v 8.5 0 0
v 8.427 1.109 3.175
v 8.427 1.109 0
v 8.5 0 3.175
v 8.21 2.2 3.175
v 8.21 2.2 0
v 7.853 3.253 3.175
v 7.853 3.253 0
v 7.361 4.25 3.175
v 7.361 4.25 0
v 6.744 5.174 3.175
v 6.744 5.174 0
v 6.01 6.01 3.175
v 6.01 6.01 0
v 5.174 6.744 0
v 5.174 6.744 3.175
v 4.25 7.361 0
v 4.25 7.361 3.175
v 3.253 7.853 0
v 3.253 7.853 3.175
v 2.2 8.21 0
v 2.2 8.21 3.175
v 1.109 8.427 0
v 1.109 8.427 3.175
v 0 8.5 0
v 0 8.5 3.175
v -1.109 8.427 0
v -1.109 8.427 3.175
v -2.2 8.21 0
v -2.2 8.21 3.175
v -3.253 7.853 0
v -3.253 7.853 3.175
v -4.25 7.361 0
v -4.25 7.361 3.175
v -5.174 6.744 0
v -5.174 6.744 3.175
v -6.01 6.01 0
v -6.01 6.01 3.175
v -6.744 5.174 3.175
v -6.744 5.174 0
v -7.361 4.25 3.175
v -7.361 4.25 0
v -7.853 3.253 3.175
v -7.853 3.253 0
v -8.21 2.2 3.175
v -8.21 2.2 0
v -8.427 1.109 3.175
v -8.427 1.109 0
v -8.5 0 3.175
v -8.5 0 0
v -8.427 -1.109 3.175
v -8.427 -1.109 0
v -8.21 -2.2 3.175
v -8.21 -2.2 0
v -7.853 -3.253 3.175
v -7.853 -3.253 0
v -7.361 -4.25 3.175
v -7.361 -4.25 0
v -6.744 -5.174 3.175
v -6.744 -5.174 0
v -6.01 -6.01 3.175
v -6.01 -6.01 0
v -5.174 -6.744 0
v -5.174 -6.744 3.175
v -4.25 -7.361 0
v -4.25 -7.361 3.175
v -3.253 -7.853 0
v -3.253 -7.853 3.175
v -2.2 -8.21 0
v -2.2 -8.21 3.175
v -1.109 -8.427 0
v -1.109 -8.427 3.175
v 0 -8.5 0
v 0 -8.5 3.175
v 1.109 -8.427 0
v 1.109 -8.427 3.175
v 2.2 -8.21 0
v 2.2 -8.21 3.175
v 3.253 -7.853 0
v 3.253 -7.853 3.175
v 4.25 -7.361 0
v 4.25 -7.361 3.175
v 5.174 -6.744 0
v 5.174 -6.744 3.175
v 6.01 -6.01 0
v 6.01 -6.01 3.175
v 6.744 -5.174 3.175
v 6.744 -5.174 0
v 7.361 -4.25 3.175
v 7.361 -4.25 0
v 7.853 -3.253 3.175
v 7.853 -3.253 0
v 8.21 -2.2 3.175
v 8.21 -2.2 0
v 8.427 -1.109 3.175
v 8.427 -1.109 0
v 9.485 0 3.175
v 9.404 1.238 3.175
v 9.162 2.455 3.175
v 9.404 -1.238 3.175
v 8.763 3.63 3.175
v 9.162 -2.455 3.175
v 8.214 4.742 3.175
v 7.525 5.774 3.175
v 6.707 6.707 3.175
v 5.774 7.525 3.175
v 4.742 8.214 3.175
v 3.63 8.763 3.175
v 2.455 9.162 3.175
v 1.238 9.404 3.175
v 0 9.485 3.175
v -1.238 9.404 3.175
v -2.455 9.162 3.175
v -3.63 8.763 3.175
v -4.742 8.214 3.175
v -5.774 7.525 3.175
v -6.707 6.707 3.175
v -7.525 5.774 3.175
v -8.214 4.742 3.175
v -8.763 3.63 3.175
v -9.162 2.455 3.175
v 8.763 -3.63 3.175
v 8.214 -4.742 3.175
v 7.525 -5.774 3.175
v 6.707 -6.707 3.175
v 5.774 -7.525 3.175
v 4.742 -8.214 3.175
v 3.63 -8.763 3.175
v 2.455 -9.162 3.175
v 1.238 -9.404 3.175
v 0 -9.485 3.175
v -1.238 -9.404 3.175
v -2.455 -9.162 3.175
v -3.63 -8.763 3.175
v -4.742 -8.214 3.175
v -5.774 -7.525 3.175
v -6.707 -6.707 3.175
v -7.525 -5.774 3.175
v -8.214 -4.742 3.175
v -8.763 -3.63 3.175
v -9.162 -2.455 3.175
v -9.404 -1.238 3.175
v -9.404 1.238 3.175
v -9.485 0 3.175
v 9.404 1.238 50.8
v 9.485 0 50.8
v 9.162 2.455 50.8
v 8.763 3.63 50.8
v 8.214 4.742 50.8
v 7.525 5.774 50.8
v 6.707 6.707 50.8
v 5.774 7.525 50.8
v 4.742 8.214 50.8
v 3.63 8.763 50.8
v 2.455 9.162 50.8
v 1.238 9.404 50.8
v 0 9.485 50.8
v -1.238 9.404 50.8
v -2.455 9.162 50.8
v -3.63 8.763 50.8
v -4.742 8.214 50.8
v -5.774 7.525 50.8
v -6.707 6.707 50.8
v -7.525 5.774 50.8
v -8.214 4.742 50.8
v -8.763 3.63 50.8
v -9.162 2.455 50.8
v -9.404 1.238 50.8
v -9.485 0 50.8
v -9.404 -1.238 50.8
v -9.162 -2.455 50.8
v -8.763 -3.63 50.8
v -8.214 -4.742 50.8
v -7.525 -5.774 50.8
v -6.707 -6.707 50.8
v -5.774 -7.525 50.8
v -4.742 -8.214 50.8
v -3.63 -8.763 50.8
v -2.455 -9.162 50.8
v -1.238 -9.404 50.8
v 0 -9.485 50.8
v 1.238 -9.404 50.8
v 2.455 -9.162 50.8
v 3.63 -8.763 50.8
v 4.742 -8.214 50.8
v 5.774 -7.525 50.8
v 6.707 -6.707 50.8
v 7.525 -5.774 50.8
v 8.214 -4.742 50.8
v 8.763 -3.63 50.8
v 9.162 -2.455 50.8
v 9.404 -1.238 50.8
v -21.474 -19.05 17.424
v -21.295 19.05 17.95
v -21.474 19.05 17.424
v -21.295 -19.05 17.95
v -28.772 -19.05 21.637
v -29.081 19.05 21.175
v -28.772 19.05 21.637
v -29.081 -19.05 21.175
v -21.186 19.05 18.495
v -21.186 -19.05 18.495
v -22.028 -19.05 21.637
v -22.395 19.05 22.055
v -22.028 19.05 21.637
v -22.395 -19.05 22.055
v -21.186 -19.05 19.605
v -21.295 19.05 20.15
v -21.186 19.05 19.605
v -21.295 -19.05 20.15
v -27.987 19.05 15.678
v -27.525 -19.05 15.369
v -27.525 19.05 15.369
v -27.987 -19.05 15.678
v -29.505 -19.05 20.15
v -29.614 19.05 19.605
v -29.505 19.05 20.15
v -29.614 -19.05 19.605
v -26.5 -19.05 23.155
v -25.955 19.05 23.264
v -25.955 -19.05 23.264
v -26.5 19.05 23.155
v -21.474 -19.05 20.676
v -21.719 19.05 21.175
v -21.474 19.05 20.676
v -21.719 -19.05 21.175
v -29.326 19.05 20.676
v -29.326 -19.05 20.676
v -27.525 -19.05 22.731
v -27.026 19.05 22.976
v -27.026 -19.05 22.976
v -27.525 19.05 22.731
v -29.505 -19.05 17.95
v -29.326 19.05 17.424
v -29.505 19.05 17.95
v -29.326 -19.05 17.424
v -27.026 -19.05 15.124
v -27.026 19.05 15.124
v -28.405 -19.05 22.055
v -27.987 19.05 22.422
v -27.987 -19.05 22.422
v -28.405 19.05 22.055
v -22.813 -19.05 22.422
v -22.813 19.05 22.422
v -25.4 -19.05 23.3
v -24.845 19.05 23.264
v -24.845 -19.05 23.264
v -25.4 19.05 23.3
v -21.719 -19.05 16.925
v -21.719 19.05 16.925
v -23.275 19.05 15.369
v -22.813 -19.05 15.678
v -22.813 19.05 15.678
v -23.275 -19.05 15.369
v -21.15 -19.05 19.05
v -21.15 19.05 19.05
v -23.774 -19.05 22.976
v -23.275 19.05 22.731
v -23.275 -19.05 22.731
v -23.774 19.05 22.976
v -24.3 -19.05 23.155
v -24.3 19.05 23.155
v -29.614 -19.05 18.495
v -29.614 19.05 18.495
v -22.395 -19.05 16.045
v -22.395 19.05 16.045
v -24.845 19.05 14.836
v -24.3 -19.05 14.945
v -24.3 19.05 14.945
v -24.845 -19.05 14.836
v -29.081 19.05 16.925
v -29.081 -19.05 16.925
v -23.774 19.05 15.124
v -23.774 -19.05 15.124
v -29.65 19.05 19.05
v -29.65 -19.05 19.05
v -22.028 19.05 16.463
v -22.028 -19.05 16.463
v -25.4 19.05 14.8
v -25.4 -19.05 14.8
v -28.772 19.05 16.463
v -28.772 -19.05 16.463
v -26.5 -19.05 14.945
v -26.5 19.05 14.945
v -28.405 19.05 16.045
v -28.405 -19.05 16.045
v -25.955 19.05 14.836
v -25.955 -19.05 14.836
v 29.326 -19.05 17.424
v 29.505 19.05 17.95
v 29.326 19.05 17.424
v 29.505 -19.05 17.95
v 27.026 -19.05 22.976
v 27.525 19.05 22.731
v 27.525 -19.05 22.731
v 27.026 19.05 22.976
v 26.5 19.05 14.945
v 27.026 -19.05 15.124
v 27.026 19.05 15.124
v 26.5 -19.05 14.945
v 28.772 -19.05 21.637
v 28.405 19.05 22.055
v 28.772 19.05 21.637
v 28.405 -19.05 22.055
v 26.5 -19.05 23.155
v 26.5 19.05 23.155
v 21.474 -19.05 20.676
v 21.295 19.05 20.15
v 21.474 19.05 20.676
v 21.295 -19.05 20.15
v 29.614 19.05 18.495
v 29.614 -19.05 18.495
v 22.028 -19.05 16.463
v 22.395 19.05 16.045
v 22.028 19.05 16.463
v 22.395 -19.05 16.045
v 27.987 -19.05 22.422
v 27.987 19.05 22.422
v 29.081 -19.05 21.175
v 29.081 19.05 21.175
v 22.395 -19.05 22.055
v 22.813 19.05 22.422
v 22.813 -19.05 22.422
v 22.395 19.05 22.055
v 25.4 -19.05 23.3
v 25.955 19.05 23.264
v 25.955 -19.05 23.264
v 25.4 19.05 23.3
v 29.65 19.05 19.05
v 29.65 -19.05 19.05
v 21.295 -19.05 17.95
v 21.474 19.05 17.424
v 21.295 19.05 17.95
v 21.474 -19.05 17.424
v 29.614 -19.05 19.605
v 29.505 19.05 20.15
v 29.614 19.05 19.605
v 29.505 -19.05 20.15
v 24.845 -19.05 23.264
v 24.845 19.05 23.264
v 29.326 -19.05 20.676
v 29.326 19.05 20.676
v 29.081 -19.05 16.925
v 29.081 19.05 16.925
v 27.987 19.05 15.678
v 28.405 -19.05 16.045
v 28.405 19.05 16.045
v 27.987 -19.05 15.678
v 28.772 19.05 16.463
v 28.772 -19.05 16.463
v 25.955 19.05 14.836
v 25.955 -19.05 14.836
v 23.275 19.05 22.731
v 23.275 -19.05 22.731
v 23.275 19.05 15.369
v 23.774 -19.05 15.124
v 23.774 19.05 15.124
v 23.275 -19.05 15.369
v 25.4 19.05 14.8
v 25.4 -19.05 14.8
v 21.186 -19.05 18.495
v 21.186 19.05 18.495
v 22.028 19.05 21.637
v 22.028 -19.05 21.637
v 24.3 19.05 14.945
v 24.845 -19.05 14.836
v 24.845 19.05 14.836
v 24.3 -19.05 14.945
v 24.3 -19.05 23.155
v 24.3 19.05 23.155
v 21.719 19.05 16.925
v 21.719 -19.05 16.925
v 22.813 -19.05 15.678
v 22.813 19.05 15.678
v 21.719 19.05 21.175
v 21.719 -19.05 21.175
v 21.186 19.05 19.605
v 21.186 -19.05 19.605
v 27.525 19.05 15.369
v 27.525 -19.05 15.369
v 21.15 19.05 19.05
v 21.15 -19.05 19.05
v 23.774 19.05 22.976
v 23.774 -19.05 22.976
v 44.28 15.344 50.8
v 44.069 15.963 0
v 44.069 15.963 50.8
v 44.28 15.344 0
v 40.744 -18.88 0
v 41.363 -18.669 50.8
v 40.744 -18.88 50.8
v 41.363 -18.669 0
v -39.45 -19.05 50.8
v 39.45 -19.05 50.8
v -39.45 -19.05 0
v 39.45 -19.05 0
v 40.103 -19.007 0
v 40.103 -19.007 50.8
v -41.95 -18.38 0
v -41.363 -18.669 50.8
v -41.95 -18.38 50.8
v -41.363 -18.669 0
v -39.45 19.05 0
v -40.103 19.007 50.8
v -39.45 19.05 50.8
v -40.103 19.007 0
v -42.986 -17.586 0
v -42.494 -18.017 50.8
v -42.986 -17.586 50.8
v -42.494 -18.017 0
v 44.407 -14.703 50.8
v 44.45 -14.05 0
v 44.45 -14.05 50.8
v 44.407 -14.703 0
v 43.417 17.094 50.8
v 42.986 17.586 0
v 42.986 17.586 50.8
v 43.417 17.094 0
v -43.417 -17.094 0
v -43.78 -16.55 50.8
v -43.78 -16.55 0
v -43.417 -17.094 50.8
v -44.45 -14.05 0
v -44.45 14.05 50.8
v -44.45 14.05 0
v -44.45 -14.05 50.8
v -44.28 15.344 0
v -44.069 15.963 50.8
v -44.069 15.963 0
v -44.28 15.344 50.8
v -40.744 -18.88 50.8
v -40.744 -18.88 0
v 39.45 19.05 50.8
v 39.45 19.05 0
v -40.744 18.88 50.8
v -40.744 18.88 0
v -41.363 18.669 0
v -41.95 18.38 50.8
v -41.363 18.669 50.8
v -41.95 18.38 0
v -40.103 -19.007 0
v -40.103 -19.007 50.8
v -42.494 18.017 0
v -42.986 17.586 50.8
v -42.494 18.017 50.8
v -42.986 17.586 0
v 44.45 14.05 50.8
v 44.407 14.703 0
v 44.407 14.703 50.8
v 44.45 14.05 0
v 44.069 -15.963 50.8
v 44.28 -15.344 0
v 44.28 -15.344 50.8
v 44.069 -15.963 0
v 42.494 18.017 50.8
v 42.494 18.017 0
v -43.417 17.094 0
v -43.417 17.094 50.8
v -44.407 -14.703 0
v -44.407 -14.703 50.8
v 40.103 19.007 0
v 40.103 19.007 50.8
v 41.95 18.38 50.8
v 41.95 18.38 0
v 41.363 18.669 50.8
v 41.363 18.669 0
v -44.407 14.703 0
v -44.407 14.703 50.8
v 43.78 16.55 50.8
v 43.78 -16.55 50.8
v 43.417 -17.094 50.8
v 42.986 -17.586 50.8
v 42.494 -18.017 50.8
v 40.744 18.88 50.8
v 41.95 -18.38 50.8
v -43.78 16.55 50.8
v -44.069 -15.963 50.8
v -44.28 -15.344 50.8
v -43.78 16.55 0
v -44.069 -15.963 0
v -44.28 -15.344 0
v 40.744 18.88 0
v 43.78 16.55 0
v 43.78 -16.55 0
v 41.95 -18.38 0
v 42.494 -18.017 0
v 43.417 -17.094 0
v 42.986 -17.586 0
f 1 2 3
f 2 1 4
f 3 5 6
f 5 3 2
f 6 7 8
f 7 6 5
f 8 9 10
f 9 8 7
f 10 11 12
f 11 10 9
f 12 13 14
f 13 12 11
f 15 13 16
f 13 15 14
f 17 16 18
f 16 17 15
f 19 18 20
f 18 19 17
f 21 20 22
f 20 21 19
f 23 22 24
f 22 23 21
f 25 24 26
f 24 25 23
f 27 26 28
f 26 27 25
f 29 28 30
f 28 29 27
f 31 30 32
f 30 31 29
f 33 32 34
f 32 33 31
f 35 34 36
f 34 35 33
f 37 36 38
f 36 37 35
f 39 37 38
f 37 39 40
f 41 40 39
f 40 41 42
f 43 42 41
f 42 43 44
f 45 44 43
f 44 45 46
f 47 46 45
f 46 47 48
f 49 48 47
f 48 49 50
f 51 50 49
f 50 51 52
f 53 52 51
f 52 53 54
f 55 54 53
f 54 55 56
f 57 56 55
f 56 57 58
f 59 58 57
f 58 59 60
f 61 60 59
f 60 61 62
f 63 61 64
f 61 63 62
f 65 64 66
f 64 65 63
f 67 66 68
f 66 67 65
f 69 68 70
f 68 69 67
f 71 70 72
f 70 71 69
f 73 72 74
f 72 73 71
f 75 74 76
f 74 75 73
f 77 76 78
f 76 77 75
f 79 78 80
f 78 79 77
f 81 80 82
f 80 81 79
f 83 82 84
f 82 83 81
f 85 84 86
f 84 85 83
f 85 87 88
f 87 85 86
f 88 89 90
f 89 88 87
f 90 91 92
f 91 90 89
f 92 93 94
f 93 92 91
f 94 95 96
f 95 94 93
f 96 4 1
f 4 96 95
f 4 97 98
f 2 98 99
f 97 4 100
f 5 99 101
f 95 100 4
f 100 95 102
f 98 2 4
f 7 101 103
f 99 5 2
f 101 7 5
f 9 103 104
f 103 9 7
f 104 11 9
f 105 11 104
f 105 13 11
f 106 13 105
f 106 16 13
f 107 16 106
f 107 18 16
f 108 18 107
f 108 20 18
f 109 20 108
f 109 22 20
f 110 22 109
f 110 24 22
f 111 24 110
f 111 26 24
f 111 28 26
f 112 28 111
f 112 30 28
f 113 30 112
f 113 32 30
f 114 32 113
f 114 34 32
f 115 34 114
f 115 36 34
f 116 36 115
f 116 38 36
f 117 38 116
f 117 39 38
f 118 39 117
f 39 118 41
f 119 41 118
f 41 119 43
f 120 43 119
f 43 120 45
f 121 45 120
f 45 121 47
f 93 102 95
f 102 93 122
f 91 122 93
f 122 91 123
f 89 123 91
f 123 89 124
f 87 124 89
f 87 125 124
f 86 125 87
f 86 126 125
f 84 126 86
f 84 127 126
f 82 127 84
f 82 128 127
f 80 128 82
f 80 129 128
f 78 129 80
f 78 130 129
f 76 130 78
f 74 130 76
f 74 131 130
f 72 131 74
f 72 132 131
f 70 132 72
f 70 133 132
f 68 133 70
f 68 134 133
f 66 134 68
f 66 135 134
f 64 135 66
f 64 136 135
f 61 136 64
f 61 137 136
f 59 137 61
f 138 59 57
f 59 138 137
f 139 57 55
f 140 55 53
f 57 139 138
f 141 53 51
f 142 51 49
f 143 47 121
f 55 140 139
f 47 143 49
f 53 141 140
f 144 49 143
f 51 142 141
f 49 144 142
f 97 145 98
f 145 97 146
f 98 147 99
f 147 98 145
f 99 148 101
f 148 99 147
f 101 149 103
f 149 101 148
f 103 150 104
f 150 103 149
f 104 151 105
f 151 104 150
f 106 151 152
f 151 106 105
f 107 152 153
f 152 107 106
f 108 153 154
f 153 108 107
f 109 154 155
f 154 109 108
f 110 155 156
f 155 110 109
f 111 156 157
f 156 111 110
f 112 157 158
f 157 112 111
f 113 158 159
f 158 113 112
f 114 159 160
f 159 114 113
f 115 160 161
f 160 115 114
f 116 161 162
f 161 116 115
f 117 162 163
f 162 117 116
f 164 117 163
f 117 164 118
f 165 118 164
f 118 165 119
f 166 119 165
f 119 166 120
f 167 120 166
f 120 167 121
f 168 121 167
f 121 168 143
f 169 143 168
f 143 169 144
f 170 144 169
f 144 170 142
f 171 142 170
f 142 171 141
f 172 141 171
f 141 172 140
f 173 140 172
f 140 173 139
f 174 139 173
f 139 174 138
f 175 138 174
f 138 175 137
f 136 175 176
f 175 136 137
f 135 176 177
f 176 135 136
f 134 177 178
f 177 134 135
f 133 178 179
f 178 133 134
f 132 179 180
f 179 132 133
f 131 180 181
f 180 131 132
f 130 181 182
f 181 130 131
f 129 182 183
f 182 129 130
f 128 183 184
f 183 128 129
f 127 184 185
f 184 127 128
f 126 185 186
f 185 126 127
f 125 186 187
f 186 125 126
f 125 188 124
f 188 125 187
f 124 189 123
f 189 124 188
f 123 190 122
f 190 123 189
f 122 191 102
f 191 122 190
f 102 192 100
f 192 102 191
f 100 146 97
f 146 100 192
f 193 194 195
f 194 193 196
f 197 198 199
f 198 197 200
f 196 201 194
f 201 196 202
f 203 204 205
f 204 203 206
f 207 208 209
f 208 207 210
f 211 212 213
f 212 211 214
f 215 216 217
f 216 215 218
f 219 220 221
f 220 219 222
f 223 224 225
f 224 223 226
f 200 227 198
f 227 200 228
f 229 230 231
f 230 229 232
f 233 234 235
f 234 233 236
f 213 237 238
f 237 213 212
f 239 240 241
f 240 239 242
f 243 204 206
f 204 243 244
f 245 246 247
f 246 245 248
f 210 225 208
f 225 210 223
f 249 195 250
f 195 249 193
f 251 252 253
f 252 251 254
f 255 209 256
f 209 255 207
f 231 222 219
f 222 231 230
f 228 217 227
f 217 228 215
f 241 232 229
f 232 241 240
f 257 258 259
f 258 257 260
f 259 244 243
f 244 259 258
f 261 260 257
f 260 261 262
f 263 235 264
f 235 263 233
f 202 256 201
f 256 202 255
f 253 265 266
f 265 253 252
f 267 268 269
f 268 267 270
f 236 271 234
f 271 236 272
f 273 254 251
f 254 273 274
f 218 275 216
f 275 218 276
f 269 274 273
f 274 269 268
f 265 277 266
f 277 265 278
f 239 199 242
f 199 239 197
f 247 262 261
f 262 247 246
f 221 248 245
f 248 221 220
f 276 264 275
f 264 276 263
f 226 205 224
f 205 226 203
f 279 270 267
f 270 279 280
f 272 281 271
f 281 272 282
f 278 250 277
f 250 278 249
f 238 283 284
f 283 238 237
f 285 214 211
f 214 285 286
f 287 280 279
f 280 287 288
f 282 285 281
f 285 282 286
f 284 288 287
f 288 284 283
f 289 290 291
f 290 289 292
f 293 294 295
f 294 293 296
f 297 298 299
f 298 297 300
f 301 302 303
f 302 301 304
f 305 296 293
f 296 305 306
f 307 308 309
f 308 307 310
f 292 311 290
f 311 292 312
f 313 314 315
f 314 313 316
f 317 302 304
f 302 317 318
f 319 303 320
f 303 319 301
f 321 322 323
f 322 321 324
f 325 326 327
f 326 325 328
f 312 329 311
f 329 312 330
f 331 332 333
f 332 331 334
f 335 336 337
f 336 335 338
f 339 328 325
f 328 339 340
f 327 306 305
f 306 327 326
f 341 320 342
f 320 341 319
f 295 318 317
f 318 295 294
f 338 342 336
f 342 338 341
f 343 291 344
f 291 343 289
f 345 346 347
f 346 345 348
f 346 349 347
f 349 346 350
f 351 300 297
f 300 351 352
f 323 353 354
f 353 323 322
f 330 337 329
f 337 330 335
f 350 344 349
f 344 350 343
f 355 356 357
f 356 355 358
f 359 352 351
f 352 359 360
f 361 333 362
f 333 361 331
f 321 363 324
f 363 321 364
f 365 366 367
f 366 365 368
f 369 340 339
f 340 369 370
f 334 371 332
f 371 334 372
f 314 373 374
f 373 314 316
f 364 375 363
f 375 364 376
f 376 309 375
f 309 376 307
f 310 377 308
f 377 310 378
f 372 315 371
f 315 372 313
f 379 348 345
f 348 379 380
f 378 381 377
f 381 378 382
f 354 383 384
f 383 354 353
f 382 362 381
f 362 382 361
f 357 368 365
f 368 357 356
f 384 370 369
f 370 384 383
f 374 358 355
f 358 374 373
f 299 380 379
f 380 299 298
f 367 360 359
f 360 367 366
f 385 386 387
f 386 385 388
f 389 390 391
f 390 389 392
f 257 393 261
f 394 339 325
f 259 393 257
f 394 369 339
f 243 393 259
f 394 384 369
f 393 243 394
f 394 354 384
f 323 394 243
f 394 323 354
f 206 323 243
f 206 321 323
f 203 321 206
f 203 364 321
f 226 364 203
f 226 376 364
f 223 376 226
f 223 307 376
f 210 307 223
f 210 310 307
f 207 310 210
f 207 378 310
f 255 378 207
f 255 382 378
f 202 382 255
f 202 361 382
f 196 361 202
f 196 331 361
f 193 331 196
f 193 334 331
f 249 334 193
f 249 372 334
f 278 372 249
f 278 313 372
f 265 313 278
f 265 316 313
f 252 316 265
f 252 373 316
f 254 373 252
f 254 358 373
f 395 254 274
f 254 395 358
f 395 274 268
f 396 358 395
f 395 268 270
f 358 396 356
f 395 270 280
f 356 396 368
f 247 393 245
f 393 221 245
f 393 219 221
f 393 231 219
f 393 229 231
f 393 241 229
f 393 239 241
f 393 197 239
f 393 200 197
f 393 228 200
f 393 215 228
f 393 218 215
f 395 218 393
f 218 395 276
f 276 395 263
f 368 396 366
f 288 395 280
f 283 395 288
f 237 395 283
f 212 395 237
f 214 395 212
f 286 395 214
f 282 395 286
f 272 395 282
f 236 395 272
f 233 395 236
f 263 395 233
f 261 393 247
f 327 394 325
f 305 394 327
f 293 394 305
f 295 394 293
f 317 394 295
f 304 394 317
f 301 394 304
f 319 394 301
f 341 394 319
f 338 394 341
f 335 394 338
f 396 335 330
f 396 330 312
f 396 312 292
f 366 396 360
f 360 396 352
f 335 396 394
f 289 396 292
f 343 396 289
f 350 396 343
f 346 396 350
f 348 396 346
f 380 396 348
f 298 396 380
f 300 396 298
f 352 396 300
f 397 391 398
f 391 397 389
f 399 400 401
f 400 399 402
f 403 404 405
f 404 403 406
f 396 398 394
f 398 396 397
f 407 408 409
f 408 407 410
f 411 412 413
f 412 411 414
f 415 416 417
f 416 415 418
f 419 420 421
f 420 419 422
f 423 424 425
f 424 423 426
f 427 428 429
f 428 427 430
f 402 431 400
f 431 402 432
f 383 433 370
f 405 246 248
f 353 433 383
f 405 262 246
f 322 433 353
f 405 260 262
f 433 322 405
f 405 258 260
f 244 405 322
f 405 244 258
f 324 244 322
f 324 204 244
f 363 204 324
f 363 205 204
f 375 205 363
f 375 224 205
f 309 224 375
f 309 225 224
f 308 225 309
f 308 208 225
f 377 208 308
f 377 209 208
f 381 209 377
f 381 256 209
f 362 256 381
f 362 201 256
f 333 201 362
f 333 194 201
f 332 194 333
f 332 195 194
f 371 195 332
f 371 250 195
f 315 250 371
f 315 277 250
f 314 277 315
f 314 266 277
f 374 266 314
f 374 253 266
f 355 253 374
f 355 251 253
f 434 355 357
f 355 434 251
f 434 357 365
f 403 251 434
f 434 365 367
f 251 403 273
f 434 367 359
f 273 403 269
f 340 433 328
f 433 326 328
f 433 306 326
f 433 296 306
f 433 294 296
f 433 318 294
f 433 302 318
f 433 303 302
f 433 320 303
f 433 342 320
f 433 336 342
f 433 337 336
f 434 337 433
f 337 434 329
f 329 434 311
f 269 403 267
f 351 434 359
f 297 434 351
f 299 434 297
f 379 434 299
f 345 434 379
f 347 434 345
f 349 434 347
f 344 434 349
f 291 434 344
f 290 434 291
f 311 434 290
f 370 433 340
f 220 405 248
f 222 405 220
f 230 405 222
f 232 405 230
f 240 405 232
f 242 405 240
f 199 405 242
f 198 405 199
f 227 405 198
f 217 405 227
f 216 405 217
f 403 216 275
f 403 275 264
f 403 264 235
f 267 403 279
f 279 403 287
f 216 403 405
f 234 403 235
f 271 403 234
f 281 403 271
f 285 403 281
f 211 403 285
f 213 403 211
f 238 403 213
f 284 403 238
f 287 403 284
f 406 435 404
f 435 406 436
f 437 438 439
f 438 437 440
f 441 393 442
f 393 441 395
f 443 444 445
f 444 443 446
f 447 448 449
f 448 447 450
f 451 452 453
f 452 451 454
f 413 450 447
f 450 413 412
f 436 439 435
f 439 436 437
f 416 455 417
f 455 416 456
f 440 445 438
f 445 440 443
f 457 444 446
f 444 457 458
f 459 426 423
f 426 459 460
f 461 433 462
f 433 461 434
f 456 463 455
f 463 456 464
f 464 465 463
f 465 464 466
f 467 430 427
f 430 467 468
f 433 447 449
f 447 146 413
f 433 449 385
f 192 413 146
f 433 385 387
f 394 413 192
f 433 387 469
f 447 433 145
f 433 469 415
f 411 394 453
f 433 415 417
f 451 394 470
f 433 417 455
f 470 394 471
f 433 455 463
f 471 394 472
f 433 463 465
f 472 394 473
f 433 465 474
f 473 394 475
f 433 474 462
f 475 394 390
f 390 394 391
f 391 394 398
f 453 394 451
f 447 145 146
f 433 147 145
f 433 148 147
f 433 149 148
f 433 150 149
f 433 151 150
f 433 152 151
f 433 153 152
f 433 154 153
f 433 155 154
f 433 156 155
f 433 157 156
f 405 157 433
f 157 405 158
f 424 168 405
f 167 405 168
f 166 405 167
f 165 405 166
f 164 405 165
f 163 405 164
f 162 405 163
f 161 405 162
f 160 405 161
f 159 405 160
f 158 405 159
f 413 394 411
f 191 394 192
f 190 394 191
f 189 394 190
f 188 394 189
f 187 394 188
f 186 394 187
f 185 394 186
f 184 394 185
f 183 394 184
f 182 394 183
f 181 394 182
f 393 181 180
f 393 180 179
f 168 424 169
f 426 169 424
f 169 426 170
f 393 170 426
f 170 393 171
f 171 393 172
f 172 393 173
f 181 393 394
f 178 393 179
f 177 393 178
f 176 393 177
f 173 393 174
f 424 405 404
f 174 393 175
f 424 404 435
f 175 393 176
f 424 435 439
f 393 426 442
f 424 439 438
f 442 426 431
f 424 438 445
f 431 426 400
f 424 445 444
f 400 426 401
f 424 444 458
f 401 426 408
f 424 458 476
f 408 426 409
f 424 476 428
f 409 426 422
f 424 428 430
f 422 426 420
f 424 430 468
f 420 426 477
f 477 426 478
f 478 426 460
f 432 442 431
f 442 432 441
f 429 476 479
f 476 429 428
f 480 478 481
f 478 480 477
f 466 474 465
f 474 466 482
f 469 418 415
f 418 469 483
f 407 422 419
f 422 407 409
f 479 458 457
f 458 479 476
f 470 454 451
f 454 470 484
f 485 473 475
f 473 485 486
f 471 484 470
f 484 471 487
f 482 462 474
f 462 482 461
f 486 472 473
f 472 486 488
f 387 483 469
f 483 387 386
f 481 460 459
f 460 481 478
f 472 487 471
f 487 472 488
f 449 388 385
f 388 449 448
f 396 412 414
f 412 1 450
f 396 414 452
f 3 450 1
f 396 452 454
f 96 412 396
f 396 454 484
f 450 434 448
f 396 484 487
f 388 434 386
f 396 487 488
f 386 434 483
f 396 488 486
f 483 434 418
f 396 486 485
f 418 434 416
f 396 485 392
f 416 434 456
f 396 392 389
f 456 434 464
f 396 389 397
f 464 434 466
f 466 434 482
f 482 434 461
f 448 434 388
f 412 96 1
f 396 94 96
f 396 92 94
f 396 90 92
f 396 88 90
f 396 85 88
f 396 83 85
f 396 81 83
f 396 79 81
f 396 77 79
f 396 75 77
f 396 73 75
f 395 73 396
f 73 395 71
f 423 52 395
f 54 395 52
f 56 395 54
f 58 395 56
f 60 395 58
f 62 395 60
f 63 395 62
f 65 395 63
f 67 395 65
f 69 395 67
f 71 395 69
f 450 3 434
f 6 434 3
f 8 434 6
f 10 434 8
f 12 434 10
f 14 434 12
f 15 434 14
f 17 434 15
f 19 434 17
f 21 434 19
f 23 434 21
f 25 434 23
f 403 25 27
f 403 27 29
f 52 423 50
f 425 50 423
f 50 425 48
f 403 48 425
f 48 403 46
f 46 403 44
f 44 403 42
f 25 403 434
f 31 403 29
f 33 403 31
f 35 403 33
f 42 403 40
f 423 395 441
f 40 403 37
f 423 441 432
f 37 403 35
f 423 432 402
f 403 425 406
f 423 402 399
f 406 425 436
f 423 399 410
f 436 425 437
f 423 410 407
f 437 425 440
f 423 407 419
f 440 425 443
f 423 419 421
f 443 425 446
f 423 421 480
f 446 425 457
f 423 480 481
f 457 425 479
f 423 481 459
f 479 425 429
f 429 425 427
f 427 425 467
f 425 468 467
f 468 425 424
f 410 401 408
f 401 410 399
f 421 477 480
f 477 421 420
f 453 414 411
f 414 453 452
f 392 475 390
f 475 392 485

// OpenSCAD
// file: ../lib/TOGUnitTable-v1.scad
// TOGUnitTable-v1.1.0 - Library for handling 'complex amounts' in the form of [multiplier, unit name], e.g. [1.5, "inch"]
//
// 2023-07-01: the following 'annotation' is something I just made up,
// but is intended as a way for future packaging tools to know that it's 'safe'
// (because everything has been somewhat namespaced) to turn a `use <x>`
// into an `include <x>`, making it inlinable:
// safe-to-include: true
// 
// Versions:
// v1.0.0:
// - Created it.
// v1.1.0:
// - Add optional 'dbgctxstr' parameter to unit decoding functions, for better error messages
// 
// Naming convention:
// Doing 'OO without classes', here.
// Fully qualified name = class or package name + "__" + member name
// Class or package name may itself be namespaced, and class names may double as package names.
// Here, tog_unittable names both a class and a package.

// Demo unit table uses 'micrometer' as the base unit
// in order to keep multipliers as integers as much as possible.
tog_unittable__demo_unit_table = [
	["um",    [    1   ,   "um"], "micrometer" ],
	["mm",    [ 1000   ,   "um"], "millimeter" ],
	["inch",  [25400   ,   "um"], "inch"       ],
	["u",     [    1/16, "inch"], "model unit" ], // As used by TGx9 et al
	["atom",  [    8   ,    "u"], "model atom" ],
	["chunk", [    3   , "atom"], "model chunk"],
];

use <./DbgCtxStrLib1.scad>

function tog_unittable__list__filter(list, predicate) = [
	for( item=list ) if( predicate(item) ) item
];
function tog_unittable__list__first(list, on_error) =
	len(list) > 0 ? list[0] : on_error();

function tog_unittable__unit_value_ca(unit_table, unit_name, dbgctxstr=undef) =
	tog_unittable__list__first(
		tog_unittable__list__filter(unit_table, function (entry) entry[0] == unit_name),
		function () assert(false,
			str("Did not find entry for unit '", unit_name, "' in unit table", dbgctxstr_errmsg_suffix(dbgctxstr))
		)
	)[1];

function tog_unittable__ca__is_valid( ca ) =
	is_list(ca) && len(ca) == 2;

// Break down 'amount' until it is in a base unit (one which is defined in terms of itself)
function tog_unittable__simplify_ca(unit_table, amount, dbgctxstr=undef) =
	assert( tog_unittable__ca__is_valid(amount), str(amount, " is not a valid Complex Amount (should be [numeric_value, \"unit_name\"])", dbgctxstr=dbgctxstr) )
	let( unit_value_ca = tog_unittable__unit_value_ca(unit_table, amount[1], dbgctxstr=dbgctxstr) )
	unit_value_ca[1] == amount[1] ? amount :
		tog_unittable__simplify_ca(unit_table, [amount[0] * unit_value_ca[0], unit_value_ca[1]]);

function tog_unittable__divide_ca(unit_table, numerator, denominator, dbgctxstr=undef) =
	let(
		numerator_base_ca   = tog_unittable__simplify_ca(unit_table, numerator, dbgctxstr=dbgctxstr),
		denominator_base_ca = tog_unittable__simplify_ca(unit_table, denominator, dbgctxstr=dbgctxstr)
	)
	assert(numerator_base_ca[1] == denominator_base_ca[1], str("Different base units found for ", numerator[1], " and ", denominator[1]))
	numerator_base_ca[0] / denominator_base_ca[0];	

assert(tog_unittable__divide_ca(tog_unittable__demo_unit_table, [1,   "mm"], [  1, "mm"]) ==     1   );
assert(tog_unittable__divide_ca(tog_unittable__demo_unit_table, [1,   "mm"], [  1, "um"]) ==  1000   );
assert(tog_unittable__divide_ca(tog_unittable__demo_unit_table, [1, "inch"], [  1, "um"]) == 25400   );
assert(tog_unittable__divide_ca(tog_unittable__demo_unit_table, [1, "inch"], [  1, "mm"]) ==    25.4 );
assert(tog_unittable__divide_ca(tog_unittable__demo_unit_table, [1, "inch"], [254, "um"]) ==   100   );
assert(tog_unittable__divide_ca(tog_unittable__demo_unit_table, [1,    "u"], [  1, "um"]) ==  1587.5 );
// file: ../lib/TOGStringLib1.scad
// TOGStringLib1.7
// 
// Functions for parsing quantities
// and other misc. string handling.
// 
// v1.5
// - togstr1_parse_quantity will treat unit-only strings as meaning 1/1 of that unit.
//   e.g. togstr1_parse_quantity("foot") = [[[1,1], "foot", 4]]
// v1.6:
// - togstr1_parse_quantity allows unit name to be omitted when quantity is zero and $togunits1_default_unit is defined
// v1.7:
// - Add optional 'dbgctxstr' parameter to unit decoding functions, for better error messages
// 
// Globals: $togunits1_default_unit - affects what 'unit' is returned
// when interpreting numbers or strings that lack the unit.


function togstr1__todo(message) = assert(false, str("TODO: ", message));

module togstr1__assert_eq(a, b) {
	if( a != b ) {
		assert( a == b, str(a, " != ", b) );
	}
}



function togstr1_slice(source, i0, i1) =
	i0 == i1 ? "" :
	str(source[i0], togstr1_slice(source, i0+1, i1));

function togstr1_tokenize(source, sep, maxcount=9999, i=0, tokenstart=0) =
	len(source) == i ? (
		(tokenstart < i) ? [togstr1_slice(source, tokenstart, i)] : []
	) :
	source[i] == sep ? (
		(tokenstart < i) ? concat([togstr1_slice(source, tokenstart, i)], togstr1_tokenize(source, sep, maxcount-1, i+1, i+1)) :
		togstr1_tokenize(source, sep, maxcount, i+1, i+1)
	) :
	maxcount <= 1 ? [togstr1_slice(source, tokenstart, len(source))] :
	togstr1_tokenize(source, sep, maxcount, i+1, tokenstart);

togstr1__assert_eq( ["foo","bar","baz"], togstr1_tokenize("foo-bar-baz", "-") );
// Duplicate delimiters are ignored
togstr1__assert_eq( ["foo","bar","baz"], togstr1_tokenize("foo--bar--baz", "-") );
// Trailing delimiters are ignored
togstr1__assert_eq( ["foo","bar","baz"], togstr1_tokenize("foo--bar--baz--", "-") );
// Leading delimiters are ignored
togstr1__assert_eq( ["foo","bar","baz"], togstr1_tokenize("--foo--bar--baz", "-") );
// Can limit number of tokens returned
togstr1__assert_eq( ["foo","bar-baz"], togstr1_tokenize("foo-bar-baz", "-", 2) );
togstr1__assert_eq( ["foo","bar-baz"], togstr1_tokenize("--foo--bar-baz", "-", 2) );
togstr1__assert_eq( ["foo","bar--baz"], togstr1_tokenize("--foo--bar--baz", "-", 2) );
togstr1__assert_eq( ["foo"], togstr1_tokenize("--foo--", "-", 2) );




/** \d+ -> [num, end_index] */
function togstr1_parse_decimal_nat(str, index=0, current=0, dbgctxstr=undef) =
	len(str) == index ? [current, index] :
	let( dig = ord(str[index]) - ord("0") )
	(dig >= 0 && dig <= 9) ? togstr1_parse_decimal_nat(str, index+1, current*10 + dig, dbgctxstr=dbgctxstr) :
	[current, index];

togstr1__assert_eq( [123,3], togstr1_parse_decimal_nat("123") );
togstr1__assert_eq( [123,3], togstr1_parse_decimal_nat("123.45") );

/** [+-]*\d+ ->  [[num, den], end_index] */
function togstr1_parse_decimal_number(str, index=0, dbgctxstr=undef) =
	str[index] == "+" ? togstr1_parse_decimal_number(str, index+1) :
	str[index] == "-" ? let(r=togstr1_parse_decimal_number(str, index+1)) [[-r[0][0], r[0][1]], r[1]] :
	let(r = togstr1_parse_decimal_nat(str, index, dbgctxstr=dbgctxstr))
	str[r[1]] != "." ? [[r[0], 1], r[1]] :
	let(fracr = togstr1_parse_decimal_nat(str, r[1]+1))
	let(mult = pow(10, fracr[1]-(r[1]+1)))
	[[r[0]*mult + fracr[0], mult], fracr[1]];

togstr1__assert_eq( [[   36,   1], 2], togstr1_parse_decimal_number( "36"   ) );
togstr1__assert_eq( [[ 3524, 100], 5], togstr1_parse_decimal_number( "35.24") );
togstr1__assert_eq( [[-3524, 100], 6], togstr1_parse_decimal_number("-35.24") );
togstr1__assert_eq( [[    0,   1], 0], togstr1_parse_decimal_number( "NotANumber") );

function togstr1__gcd(a, b) = b == 0 ? abs(a) : togstr1__gcd(b, a % b);

togstr1__assert_eq(10, togstr1__gcd(10, 20));
togstr1__assert_eq( 5, togstr1__gcd(10, 15));
togstr1__assert_eq( 2, togstr1__gcd(10, 14));


function togstr1__normalize_rat(rat) =
	let(gcd = togstr1__gcd(rat[0], rat[1]))
	// TODO: find LCD, divide top and bottom by it
	rat[0] < 0 && rat[1] < 0 ? [-rat[0]/gcd, -rat[1]/gcd] :
	[rat[0]/gcd, rat[1]/gcd];

/** <decnum>[/<decnum>] -> [[num, den], end_index] */
function togstr1__multiply_rat(a, b) =
	togstr1__normalize_rat(
		a[1] == b[1] ? [a[0]*b[0]/a[1], a[1]] : // TODO: LCD instead of special case
		[a[0]*b[0], a[1]*b[1]]
	);
function togstr1__divide_rat(a, b) = togstr1__normalize_rat([a[0]*b[1], a[1]*b[0]]);


function togstr1__add_rat(a, b) =
	togstr1__normalize_rat([a[0]*b[1] + b[0]*a[1], a[1]*b[1]]);
	
togstr1__assert_eq([1, 2], togstr1__add_rat([1, 3], [1, 6]));


/** Return [[num, den], end_index] */
function togstr1_parse_rational_number(str, index=0, dbgctxstr=undef) =
	let( numr = togstr1_parse_decimal_number(str, index, dbgctxstr=dbgctxstr) )
	str[numr[1]] == "+" ?
		let(numrb = togstr1_parse_rational_number(str, numr[1]+1, dbgctxstr=dbgctxstr))
		[togstr1__add_rat(numr[0], numrb[0]), numrb[1]]	:
	str[numr[1]] == "/" ?
		let( denr = togstr1_parse_decimal_number(str, numr[1]+1, dbgctxstr=dbgctxstr) )
		[togstr1__divide_rat(numr[0], denr[0]), denr[1]] :
	numr;

togstr1__assert_eq( [[   123,  1],3], togstr1_parse_rational_number( "123") );
togstr1__assert_eq( [[   123,  1],4], togstr1_parse_rational_number("+123") );
togstr1__assert_eq( [[-  123,  1],4], togstr1_parse_rational_number("-123") );
togstr1__assert_eq( [[   123,  1],6], togstr1_parse_rational_number("-+-123") );
togstr1__assert_eq( [[ 12345,100],6], togstr1_parse_rational_number("123.45") );
togstr1__assert_eq( [[  2469, 40],8], togstr1_parse_rational_number("123.45/2") );
togstr1__assert_eq( [[-  823,160],10], togstr1_parse_rational_number("-123.45/24") );
togstr1__assert_eq( [[     4,  3],5], togstr1_parse_rational_number( "1+1/3") );
togstr1__assert_eq( [[     0,  1],0], togstr1_parse_rational_number( "NotANumber!!") );


/** Return [[[num, den], unit], end_index] */
function togstr1_parse_quantity(str, dbgctxstr=undef) =
	let( numr = togstr1_parse_rational_number(str, dbgctxstr=dbgctxstr) )
	// For now, just let the unit be the rest of the string;
	// can revisit to stop at delimiters if needed in the future.
	numr[1] > 0 && numr[1] == len(str) && numr[0][0] == 0 && !is_undef($togunits1_default_unit) ? [[[0,1], $togunits1_default_unit], numr[1]] :
	assert( numr[1] < len(str), str("Quantity string missing unit: '", str, "'; note that '0' is acceptable if $togunits1_default_unit is defined"))
	let( unit = togstr1_slice(str, numr[1], len(str)) )
	let( quant = numr[1] > 0 ? numr[0] : [1,1] ) // No number = 1 (possibly this should be an error instead)
	[[quant, unit], len(str)];

togstr1__assert_eq( [[[  3,  1], "acre"],  5], togstr1_parse_quantity("3acre") );
togstr1__assert_eq( [[[  3,  5], "acre"],  7], togstr1_parse_quantity("3/5acre") );
togstr1__assert_eq( [[[301,500], "acre"], 10], togstr1_parse_quantity("3.01/5acre") );
togstr1__assert_eq( [[[  1,  1], "acre"],  4], togstr1_parse_quantity("acre") ); // Should either treat as one or throw an error!
togstr1__assert_eq( [[[  0,  1],"hectare"],1], togstr1_parse_quantity("0", $togunits1_default_unit="hectare") ); // Zero is fine if $togunits1_default_unit is defined
// file: ../lib/TOGridLib3.scad
// TOGridPileLib-v3.4
// 
// HOKAY WHAT ARE THE COMMON
// things that I want the library to do?
// 
// - [X] Be `include`-able, to make inlining easy
// - [X] Allow unit table to be overridden easily, but default by default
// - [ ] Support common configurations by name (e.g. "V9", or some "WSTYPE-...")
//   without having to pass 50 different parameters in
// - [ ] Support subtractions for those common configurations also,
//   such that you don't need to remember to 'do less rounding', etc.
// - [ ] Make a simple foot-only block that I can subtract stuff from
//   params: foot style
// - [ ] Make a block with a lip
// - [ ] Make a block foot, and I'll intersect it with some other things
// - [X] Translate a block_size_ca to mm
// 
// Changes:
// v3.1:
// - s/togridpile3_decode_size/togridpile3_decode_vector/
// v3.2:
// - togridpile3_decode(num) = num
// v3.3:
// - Change prefix from `togridpile3` to `togridlib3`
// v3.4:
// - Add optional 'dbgctxstr' parameter to unit decoding functions, for better error messages

use <../lib/TOGUnitTable-v1.scad>

function togridlib3_map(arr, fn) = [ for(item=arr) fn(item) ];

togridlib3_default_unit_table = [
	["um",    [    1,               "um"]],
	["mm",    [ 1000,               "um"]],
	["inch",  [25400,               "um"]],
	["u",     [    1.5875,          "mm"]],
	["atom",  [    8,                "u"]],
	["chunk", [    3,             "atom"]],
	["tgp-standard-bevel"   , [2,    "u"]], // Usuually 1/8"
	["m-outer-corner-radius", [4,    "u"]],
	["f-outer-corner-radius", [3,    "u"]],
];

function togridlib3_get_default_unit_table() = togridlib3_default_unit_table;
function togridlib3_get_unit_table() = is_undef($togridlib3_unit_table) ? togridlib3_default_unit_table : $togridlib3_unit_table;

function togridlib3_decode(dim, unit=[1, "mm"], unit_table=togridlib3_get_unit_table(), dbgctxstr=undef) =
	is_num(dim) ? dim : tog_unittable__divide_ca(unit_table, dim, unit, dbgctxstr=dbgctxstr);
function togridlib3_decode_vector(size, unit=[1, "mm"], unit_table=togridlib3_get_unit_table(), dbgctxstr=undef) =
	togridlib3_map(size, function(dim) is_num(dim) ? dim : tog_unittable__divide_ca(unit_table, dim, unit, dbgctxstr=dbgctxstr));

module togridlib3_cube(size, offset=0) {
	cube(togridlib3_decode_vector(size), center=true);
}
// file: ../lib/DbgCtxStrLib1.scad
// DbgCtxStrLib1.0
// 
// Library for dealing with 'debug context strings' (usually 'dbgctxstr').

function dbgctxstr_errmsg_suffix(dbgctxstr) =
	is_undef(dbgctxstr) || dbgctxstr == "" ? "" :
	str(" (", dbgctxstr, ")");
// file: ../lib/TOGArrayLib1.scad
// TOGArrayLib1.5
// 
// Functions for working with arrays.
// 
// v1.1:
// - tal1_reduce assert(is_list(items)) to prevent infinite recursion
//   when given undefined or other non-list values
// v1.1.1:
// - Fix tal1_uniq_remap_v2 to return "list-remap-result" as the
//   first element of the returned list
// v1.2:
// - Add tal1_replace_at function
// v1.3:
// - tal1_is_vec_of, tal1_is_vec_of_num
// v1.4:
// - tal1_assert_for_each, for when you want to assert something
//   about each of a list of items and get nice failure messages
// v1.5:
// - Add tal1_duplicate_reversed function, which may be
//   handy when generating symmetrical polygons and stuff.

/**
 * Make a list with the contents of list `a`,
 * but starting at offset `off`, replaced by the contents of list `b`.
 * len(result) = max(len(a), off+len(b))
 */
function tal1_replace_at(a, off, b, default_value=undef, default_value_function=undef) =
	assert(is_list(a))
	assert(is_list(b))
	let( _dvf = !is_undef(default_value_function) ? default_value_function : function(i) default_value )
[
	for( i=[0:1:min(off,len(a))-1] ) a[i],
	for( i=[len(a):1:off-1] ) _dvf(i),
	for( i=[off:1:off+len(b)-1] ) b[i-off],
	for( i=[off+len(b):1:len(a)-1] ) a[i],
];

// Simplest case
assert([] == tal1_replace_at([], 0, []));
// Second simplest cases
assert(["foo"] == tal1_replace_at(["foo"], 0, []));
assert(["foo"] == tal1_replace_at([], 0, ["foo"]));
// Replace one item
assert(["foo","quux","baz"] == tal1_replace_at(["foo","bar","baz"], 1, ["quux"]));
// Replace and extend
assert(["foo","quux","tuna","tina"] == tal1_replace_at(["foo","bar","baz"], 1, ["quux", "tuna", "tina"]));
// Add beyond end of `a`
assert(["foo","zzz","quux"] == tal1_replace_at(["foo"], 2, ["quux"], default_value="zzz"));
// Adding 'nothing' should still fill to that point with defaults
assert(["foo","zzz","zzz"] == tal1_replace_at(["foo"], 3, [], default_value="zzz"));


function tal1_reduce(start, items, func, offset=0) =
	assert(is_list(items))
	len(items) == offset ? start :
	tal1_reduce(func(start, items[offset]), items, func, offset+1);

function tal1_consecutive_duplicate_count(items) = tal1_reduce(
	[0, undef],
	items,
	function(z,item) [z[0] + (item == z[1] ? 1 : 0), item]
)[0];

assert(0 == tal1_consecutive_duplicate_count([]));
assert(0 == tal1_consecutive_duplicate_count([50]));
assert(1 == tal1_consecutive_duplicate_count([50,50]));
assert(0 == tal1_consecutive_duplicate_count([50,51,52,53]));
assert(1 == tal1_consecutive_duplicate_count([50,51,52,52]));
assert(3 == tal1_consecutive_duplicate_count([50,50,50,50]));

// Set test_size to arbirarily large values
// to ensure that OpenSCAD can handle heavy recursion
let(test_size=1000) assert(test_size/2 == tal1_consecutive_duplicate_count([for(i=[0:1:test_size-1]) floor(i/2)]));



function tal1_uniq_(items, off0, off1) =
	let(chunklen = off1-off0)
	chunklen == 0 ? [] :
	chunklen == 1 ? [items[off0]] :
	let(half=floor(chunklen/2))
	let(left  = tal1_uniq_(items, off0     , off0+half))
	let(right = tal1_uniq_(items, off0+half, off1     ))
	assert(len(left) > 0)
	assert(len(right) > 0)
	left[len(left)-1] == right[0] ? [each left, for(i=[1:1:len(right)-1]) right[i]] :
	[each left, each right];

/** Given a list of items, returns a new list with identical consecutive items merged */
function tal1_uniq(items) = tal1_uniq_(items, 0, len(items));

assert([] == tal1_uniq([]));
assert([123] == tal1_uniq([123]));
assert([55,0,1,2,3] == tal1_uniq([55,0,1,2,3]));
assert([55,0,1,2] == tal1_uniq([55,0,1,1,2]));
assert([55,0,1] == tal1_uniq([55,55,0,0,0,0,0,0,1,1,1,1]));
assert([55,0] == tal1_uniq([55,0,0,0,0,0,0,0]));



/**
 * Returns [new items, old index -> new index mapping].
 * No-op version.
 */
function tal1_uniq_remap_v1(items) =
	["list-remap-result", items, [for (vi=[0:1:len(items)-1]) vi]];

// [a, a, b, b, c, c]
//
// [a,    ...], []  -> [a],[0]
// [a, a, ...], [0] -> [a],[0,0]

assert([1,2,3] == [1,2,3]);

/**
 * Recursive version that will combine adjacent identical vertexes,
 * but will use the original items.
 */
function tal1_uniq_remap_v2(items, map=[]) =
	let(index = len(map))
	len(items) == index ? ["list-remap-result", items, map] :
	index == 0 ? tal1_uniq_remap_v2(items, [0]) :
	items[index] == items[map[index-1]] ? tal1_uniq_remap_v2(items, [for(vi=map) vi, map[index-1]]) :
	tal1_uniq_remap_v2(items, [for(vi=map) vi, index]);

assert(tal1_uniq_remap_v2([1,1,2,2,3,4]) == ["list-remap-result", [1,1,2,2,3,4], [0,0,2,2,4,5]]);


/**
 * Returns true if `vec` is a list of at least min_len items
 * and component_check(each item, even those beyond min_len) is true.
 */
function tal1_is_vec_of(vec, min_len=0, component_check=function(x) true) =
	assert(is_num(min_len) && min_len >= 0)
	assert(is_function(component_check))
	is_list(vec) && len(vec) >= min_len &&
	tal1_reduce(true, vec, function(prev,item) prev && component_check(item));

function tal1_is_vec_of_num(vec, min_len=0) = tal1_is_vec_of(vec, min_len, function(i) is_num(i));

assert( true == tal1_is_vec_of_num([1,2,3]));
assert( true == tal1_is_vec_of_num([]));
assert( true == tal1_is_vec_of_num([1,2,3], 3));
assert(false == tal1_is_vec_of_num([1,2], 3));
assert(false == tal1_is_vec_of_num([1,2,"spoon"], 3));
// Requirements are ambiguous when
// first min_len items are numbers, but there are non-numeric items afterwards,
// so let's error on the side of saying 'no, it's not a list of numbers';
// i.e. the item check and the min_len are independent.
assert(false == tal1_is_vec_of_num([1,2,3,"artichoke"], 3));


/**
 * Asserts that item_checker(each item in list, index of item)[0] is true.
 * Second element of item_checker return value is assertion message.
 * Returns the original list, in case that's useful to you.
 */
function tal1_assert_for_each(list, item_checker) =
	let( _ignored = [ for(i=[0:1:len(list)-1])
		let(q=item_checker(list[i],i))
		let(passed=is_bool(q) ? q : is_list(q) ? q[0] : assert(false, str(
			"tal1_assert_for_each: item_checker should return Bool|[Bool,String], but returned ",
			q, " for item at index ", i)))
		let(message=is_list(q) ? q[1] : undef)
		assert(passed, message)
		q
	])
	list;

// Callback can return a boolean...
assert([1,2,3] == tal1_assert_for_each([1,2,3], function(v,i) is_num(v)));
// ...or a [boolean, string]
assert([1,2,3] == tal1_assert_for_each([1,2,3], function(v,i) [is_num(v), "element be a num"]));

// [a, b, c] -> [a, b, c, rxf(c), rxf(b), rxf(a)]
function tal1_duplicate_reversed(list, rxf=function(item) item) =
	[
		each list,
		for( i=[len(list)-1 : -1 : 0] ) rxf(list[i]),
	];
// file: ../lib/TOGUnits1.scad
// TOGUnits1.7
// 
// For simlifying quantity parsing and unit conversion
// 
// v1.1:
// - Add `togunits1_decode` function
// v1.2:
// - Add togunits1_decode_vec
// v1.3:
// - Add togunits1_vec_to_cas
// v1.4:
// - Add togunits1_vec_to_mms
// v1.5:
// - Remove unused `unit` parameter from `togunits1_vec_to_cas`
// v1.6:
// - togunits1_decode accepts `xf` parameter, same as togunits1_decode_vec
// v1.7:
// - Add optional 'dbgctxstr' parameter to unit decoding functions, for better error messages
// 
// Reserved but not-yet-actually-used globals:
// - $togunits1_default_unit - default unit when interpreting "0"
//   - See TOGStringLib1
// - $togunits1_default_implied_unit - when interpreting quantities without unit, assume they have this one
//   - This might be a bad idea, so never implemented!

use <./DbgCtxStrLib1.scad>
use <./TOGridLib3.scad>
use <./TOGStringLib1.scad>

function togunits1__is_ca(what) =
	is_list(what) && len(what) == 2 && is_num(what[0]) && is_string(what[1]);

function togunits1__parse_to_ca(what, dbgctxstr=undef) =
	assert( is_string(what) )
	let( parseresult = togstr1_parse_quantity(what, dbgctxstr) )
	assert( parseresult[1] > 0, str("Failed to parse quantity from  ", what, dbgctxstr=dbgctxstr) )
	let( parsed = parseresult[0] )
	let( rat = parsed[0] )
	let( unit = parsed[1] )
	[rat[0]/rat[1], unit];

function togunits1_to_ca(what, dbgctxstr=undef) =
	is_string(what) ? togunits1__parse_to_ca(what, dbgctxstr=dbgctxstr) :
	togunits1__is_ca(what) ? what :
	is_num(what) ? [what, "mm"] :
	assert(false, str("Unrecognized quantity representation: ", what));

function togunits1_vec_to_cas(whats) =
	[for(w=whats) togunits1_to_ca(w)];

function togunits1__get_transform(name) =
	is_function(name) ? name :
	is_undef(name) ? function(n) n :
	name == "round" ? function(n) round(n) :
	name == "ceil" ? function(n) ceil(n) :
	assert(false, str("Unrecognized transform: '", name, "'"));

function togunits1_decode(what, unit=[1,"mm"], xf=undef, dbgctxstr=undef) =
	let( ca = togunits1_to_ca(what, dbgctxstr=dbgctxstr) )
	let( xf1 = togunits1__get_transform(xf) )
	xf1(togridlib3_decode(ca, unit=togunits1_to_ca(unit), dbgctxstr=dbgctxstr));

function togunits1_decode_vec(whats, unit=[1,"mm"], xf=undef) =
	let( unit_ca = togunits1_to_ca(unit) )
	let( xf1 = togunits1__get_transform(xf) )
	[for(w=whats) xf1(togunits1_decode(w, unit_ca))];

function togunits1_to_mm(what, dbgctxstr=undef) = togunits1_decode(what, [1,"mm"], dbgctxstr=dbgctxstr);
function togunits1_vec_to_mms(what) = togunits1_decode_vec(what, [1,"mm"]);
// file: ../lib/TOGMod1Constructors.scad
// TOGMod1Constructors-v1.11
// 
// Functions to construct objects understood by TOGMod1
// 
// v1.1:
// - Add togmod1_make_rounded_rect
// v1.2:
// - togmod1_make_rounded_rect can make ovals
// v1.3:
// - togmod1_circle_points, to just get the points of a circle
// - if pos parameter to circle function has a third element,
//   returned vertexes will include it as the z component;
// v1.3.1
// - Some assertions
// v1.4:
// - Refactor togmod1_rounded_rect_points and togmod1_circle_points
//   to use togmod1__make_nd_vector_adder for adapting to whatever
//   `pos` parameter is.
// v1.5:
// - togmod_rounded_rect_points will not simplify completely rounded sides
//   (where length of side is exactly twice the rounding radius)
//   unless simplify_rounded_sides=true
//   - This makes it more useful for polyhedron generation,
//     where radius varies, but number of points must remain constant.
// v1.6:
// - togmod1_make_rect makes a simple rectangle
// - togmod1_make_rounded_rect will defer to togmod1_make_rect when r=0
// v1.7:
// - togmod1_make_circle will return empty shape (["union"]) when d=0
// v1.8:
// - Add togmod1_text
// v1.9:
// - togmod1_circle_points uses 3 as minimum circle point count instead of 6
// v1.10:
// - Fix togmod1_linear_extrude_y so that range corresponds to Y start/end and
//   polygon X,Y correspond to X,Z.  Previously it was rotated wrongly,
//   which would have gone unnoticed for symmetrical shapes centered at 0,0.
// v1.11:
// - Remove an 'echo'

use <./TOGArrayLib1.scad>

function togmod1__make_nd_vector_adder(origin=[0,0]) =
	let(origin_is_zero = tal1_reduce(true, origin, function(prev,item) prev && item == 0))
	origin_is_zero ? (function(vec) len(vec) >= len(origin) ? vec : tal1_replace_at(origin, 0, vec)) :
	function(vec) [
		for(i=[0:1:max(len(origin),len(vec))-1]) (len(vec) > i ? vec[i] : 0) + (len(origin) > i ? origin[i] : 0),
	];

assert([1,2,3] == togmod1__make_nd_vector_adder()([1,2,3]));
assert([1,2,3] == togmod1__make_nd_vector_adder([0,0,3])([1,2]));


function togmod1_make_cuboid(size) =
	assert(is_list(size))
	assert(len(size) >= 3)
	assert(is_num(size[0]))
	assert(is_num(size[1]))
	assert(is_num(size[2]))
	["polyhedron-vf", [
		[-size[0]/2, -size[1]/2, -size[2]/2],
		[+size[0]/2, -size[1]/2, -size[2]/2],
		[-size[0]/2, +size[1]/2, -size[2]/2],
		[+size[0]/2, +size[1]/2, -size[2]/2],
		[-size[0]/2, -size[1]/2, +size[2]/2],
		[+size[0]/2, -size[1]/2, +size[2]/2],
		[-size[0]/2, +size[1]/2, +size[2]/2],
		[+size[0]/2, +size[1]/2, +size[2]/2]
	], [
		[0,1,3,2],[0,4,5,1],[4,6,7,5],[3,7,6,2],[1,5,7,3],[6,4,0,2]
	]];

function togmod1_make_polygon(verts) =
	["polygon-vp", verts, [[for( i=[0:1:len(verts)-1] ) i%len(verts)]]];

function togmod1_rounded_rect_points(size, r, pos=[0,0], simplify_rounded_sides=false) =
	assert(is_list(size))
	assert(len(size) >= 2)
	let(radii = is_list(r) ? r : is_num(r) ? [r,r] : assert(false, "rounded_rect r(adius) should be list<num> or num"))
	let(rx = radii[0])
	let(ry = radii[1])
	assert(is_num(rx))
	assert(is_num(ry))
	assert(size[0] >= 2*rx, str("size[0] must be >= 2*r[0]; size[0] = ",size[0],", 2*r[0] = ",2*rx))
	assert(size[1] >= 2*ry, str("size[1] must be >= 2*r[1]; size[1] = ",size[1],", 2*r[1] = ",2*ry))
	let(quarterfn=max($fn/4, 1))
	let(qfnx = simplify_rounded_sides && size[0] == 2*rx ? quarterfn-1 : quarterfn)
	let(qfny = simplify_rounded_sides && size[1] == 2*ry ? quarterfn-1 : quarterfn)
	let(finalizepos = togmod1__make_nd_vector_adder(pos))
[
	for(a=[0 : 1 : qfnx]) let(ang=      a*90/quarterfn) finalizepos([ size[0]/2-rx + rx*cos(ang),  size[1]/2-ry + ry*sin(ang)]),
	for(a=[0 : 1 : qfny]) let(ang= 90 + a*90/quarterfn) finalizepos([-size[0]/2+rx + rx*cos(ang),  size[1]/2-ry + ry*sin(ang)]),
	for(a=[0 : 1 : qfnx]) let(ang=180 + a*90/quarterfn) finalizepos([-size[0]/2+rx + rx*cos(ang), -size[1]/2+ry + ry*sin(ang)]),
	for(a=[0 : 1 : qfny]) let(ang=270 + a*90/quarterfn) finalizepos([ size[0]/2-rx + rx*cos(ang), -size[1]/2+ry + ry*sin(ang)]),
];

function togmod1_make_rect(size) =
	togmod1_make_polygon([
		[-size[0]/2, -size[1]/2],
		[+size[0]/2, -size[1]/2],
		[+size[0]/2, +size[1]/2],
		[-size[0]/2, +size[1]/2],
	]);

function togmod1_make_rounded_rect(size, r) =
	r == 0 ? togmod1_make_rect(size) :
	togmod1_make_polygon(togmod1_rounded_rect_points(size,r,simplify_rounded_sides=true));

/**
 * Returns points for an approximation of a circle where points are at distance r from pos.
 * Can be used to make other regular polygons, but the faces will be less than that
 * distance from pos (do some trig if you want face distance, e.g. for a hex nut).
 */
function togmod1_circle_points(r, pos=[0,0], d=undef) =
	assert( !is_undef(r) || !is_undef(d) )
	assert(!is_undef(pos[0]))
	assert(!is_undef(pos[1]))
	let(finalizepos = togmod1__make_nd_vector_adder(pos))
	let(r_ = !is_undef(r) ? r : d/2)
	let(fn = max($fn, 3))
	[for(i=[0 : 1 : fn-1]) finalizepos([r_*cos(i*360/fn), r_*sin(i*360/fn)])];

function togmod1_make_circle(r, pos=[0,0], d=undef) =
	r == 0 || d == 0 ? ["union"] :
	togmod1_make_polygon(togmod1_circle_points(r=r, pos=pos, d=d));

function togmod1_make_cylinder(d, zrange=[0,1], r=undef, pos=[0,0]) =
	assert( !is_undef(r) || !is_undef(d) )
	let( r_ = !is_undef(r) ? r : d/2 )
	// TODO: Make polyhedron directly
	["linear-extrude-zs", zrange, togmod1_make_circle(r=r_, pos=pos)];

function togmod1__is_range1d(range) = is_list(range) && len(range) == 2 && is_num(range[0]) && is_num(range[1]);

function togmod1_linear_extrude_z(range, shape) =
	assert(togmod1__is_range1d(range))
	["linear-extrude-zs", range, shape];
function togmod1_linear_extrude_x(range, shape) =
	assert(togmod1__is_range1d(range))
	["rotate", [90, 0, 90], togmod1_linear_extrude_z(range, shape)];
function togmod1_linear_extrude_y(range, shape) =
	assert(togmod1__is_range1d(range))
	["rotate", [90, 0,  0], togmod1_linear_extrude_z([-range[1], -range[0]], shape)];

function togmod1_text(text, size, font, halign, valign, spacing, direction, language, script) =
	["text-tsfhvsdls", text, size, font, halign, valign, spacing, direction, language, script];
// file: ../lib/TOGMod1.scad
// TOGMod1.9
// OpenSCAD library for representing shapes
// 
// See also: Functional OpenSCAD (https://github.com/thehans/FunctionalOpenSCAD)
// 
// v1.8:
// - Add `text-tsfhvsdls`
// v1.9
// - Add `offset-ds` (offset with _d_elta a _s_hape)

module togmod1_domodule(mod) {
	assert(is_list(mod));
	assert(len(mod) > 0);
	if( mod[0] == "polygon-vp" ) {
		// ["polygon-vp", vertexes, paths]
		polygon(points=mod[1], paths=mod[2]);
	} else if( mod[0] == "polyhedron-vf" ) {
		polyhedron(mod[1], faces=mod[2]);
	} else if( mod[0] == "scale" ) {
		assert(len(mod) == 3);
		scale(mod[1]) togmod1_domodule(mod[2]);
	} else if( mod[0] == "translate" ) {
		assert(len(mod) == 3);
		assert(is_list(mod[1]));
		for(c=mod[1]) assert(is_num(c), "translate component should be numeric");
		translate(mod[1]) togmod1_domodule(mod[2]);
	} else if( mod[0] == "rotate" ) {
		assert(len(mod) == 3);
		rotate(mod[1]) togmod1_domodule(mod[2]);
	} else if( mod[0] == "intersection" ) {
		intersection_for( i=[1:1:len(mod)-1] ) togmod1_domodule(mod[i]);
	} else if( mod[0] == "difference" ) {
		difference() {
			togmod1_domodule(mod[1]);
			for( i=[2:1:len(mod)-1] ) togmod1_domodule(mod[i]);
		}
	} else if( mod[0] == "union" ) {
		for( i=[1:1:len(mod)-1] ) togmod1_domodule(mod[i]);
	} else if( mod[0] == "hull" ) {
		hull() for( i=[1:1:len(mod)-1] ) togmod1_domodule(mod[i]);
	} else if( mod[0] == "offset-rs" ) {
		assert(len(mod) == 3);
		assert(is_num(mod[1]));
		assert(is_list(mod[2]));
		offset(mod[1]) togmod1_domodule(mod[2]);
	} else if( mod[0] == "linear-extrude-zs" ) {
		// ["linear-extrude-zs", [z0,z1], 2d_shape] // centered
		// ["linear-extrude-zs", height, 2d_shape]
		let( zrange = is_list(mod[1]) ? mod[1] : [-mod[1]/2, mod[1]/2] ) {
			translate([0,0,zrange[0]]) linear_extrude(zrange[1]-zrange[0]) togmod1_domodule(mod[2]);
		}
	} else if( mod[0] == "render" ) {
		render() togmod1_domodule(mod[1]);
	} else if( mod[0] == "minkowski" ) {
		minkowski() {
			togmod1_domodule(mod[1]);
			togmod1_domodule(mod[2]);
		}
	} else if( mod[0] == "x-debug" ) {
		# togmod1_domodule(mod[1]);
	} else if( mod[0] == "x-color" ) {
		color(mod[1]) togmod1_domodule(mod[2]);
	} else if( mod[0] == "text-tsfhvsdls" ) {
		text(text=mod[1], size=mod[2], font=mod[3], halign=mod[4], valign=mod[5], spacing=mod[6], direction=mod[7], language=mod[7], script=mod[8]);
	} else if( mod[0] == "offset-ds" ) {
		assert(is_num(mod[1]));
		assert(is_list(mod[2]));
		offset(delta=mod[1]) togmod1_domodule(mod[2]);
	} else {
		assert(false, str("Unrecognized shape: ", mod[0]));
	}
}
// main file
// DrillBitBushingJig3.1
// 
// v3.1:
// - Parameters for stuff

width = "3.5inch";
height = "2inch";

main_hole_floor_diameter = "17mm";
main_hole_floor_thickness = "1/8inch";
main_hole_diameter = "18.97mm";

lateral_hole_spacing = "2inch";
lateral_hole_diameter = "8.5mm";

$fn = 48;

module __drillbibushingjjig3__end_params() { }

use <../lib/TOGMod1.scad>
use <../lib/TOGMod1Constructors.scad>
use <../lib/TOGPolyhedronLib1.scad>
use <../lib/TOGUnits1.scad>

main_hole_floor_diameter_mm = togunits1_to_mm(main_hole_floor_diameter);
main_hole_floor_thickness_mm = togunits1_to_mm(main_hole_floor_thickness);
main_hole_diameter_mm = togunits1_to_mm(main_hole_diameter);
width_mm = togunits1_to_mm(width);
height_mm = togunits1_to_mm(height);
lateral_hole_spacing_mm = togunits1_to_mm(lateral_hole_spacing);
lateral_hole_diameter_mm = togunits1_to_mm(lateral_hole_diameter);

togmod1_domodule(
	let(inch = 25.4)
	let(lateral_hole = tphl1_make_z_cylinder(zrange=[-100,100], d=lateral_hole_diameter_mm))
	["difference",
		togmod1_linear_extrude_z([0, height_mm], togmod1_make_rounded_rect([width_mm, 1.5*inch], r=5)),
		
		let(d0 = main_hole_floor_diameter_mm)
		let(d1 = main_hole_diameter_mm)
		let(ft = main_hole_floor_thickness_mm)
		tphl1_make_z_cylinder(zds=[
			               [  0        - 1, d0],
			if( d1 != d0 ) [ ft           , d0],
			if( d1 != d0 ) [ ft           , d1],
			               [ height_mm + 1, d1]
		]),
		
		for( xm=[-1,+1] ) ["translate", [xm*lateral_hole_spacing_mm/2, 0, 3/4*inch], ["rotate", [90,0,0], lateral_hole]],
	]
);
